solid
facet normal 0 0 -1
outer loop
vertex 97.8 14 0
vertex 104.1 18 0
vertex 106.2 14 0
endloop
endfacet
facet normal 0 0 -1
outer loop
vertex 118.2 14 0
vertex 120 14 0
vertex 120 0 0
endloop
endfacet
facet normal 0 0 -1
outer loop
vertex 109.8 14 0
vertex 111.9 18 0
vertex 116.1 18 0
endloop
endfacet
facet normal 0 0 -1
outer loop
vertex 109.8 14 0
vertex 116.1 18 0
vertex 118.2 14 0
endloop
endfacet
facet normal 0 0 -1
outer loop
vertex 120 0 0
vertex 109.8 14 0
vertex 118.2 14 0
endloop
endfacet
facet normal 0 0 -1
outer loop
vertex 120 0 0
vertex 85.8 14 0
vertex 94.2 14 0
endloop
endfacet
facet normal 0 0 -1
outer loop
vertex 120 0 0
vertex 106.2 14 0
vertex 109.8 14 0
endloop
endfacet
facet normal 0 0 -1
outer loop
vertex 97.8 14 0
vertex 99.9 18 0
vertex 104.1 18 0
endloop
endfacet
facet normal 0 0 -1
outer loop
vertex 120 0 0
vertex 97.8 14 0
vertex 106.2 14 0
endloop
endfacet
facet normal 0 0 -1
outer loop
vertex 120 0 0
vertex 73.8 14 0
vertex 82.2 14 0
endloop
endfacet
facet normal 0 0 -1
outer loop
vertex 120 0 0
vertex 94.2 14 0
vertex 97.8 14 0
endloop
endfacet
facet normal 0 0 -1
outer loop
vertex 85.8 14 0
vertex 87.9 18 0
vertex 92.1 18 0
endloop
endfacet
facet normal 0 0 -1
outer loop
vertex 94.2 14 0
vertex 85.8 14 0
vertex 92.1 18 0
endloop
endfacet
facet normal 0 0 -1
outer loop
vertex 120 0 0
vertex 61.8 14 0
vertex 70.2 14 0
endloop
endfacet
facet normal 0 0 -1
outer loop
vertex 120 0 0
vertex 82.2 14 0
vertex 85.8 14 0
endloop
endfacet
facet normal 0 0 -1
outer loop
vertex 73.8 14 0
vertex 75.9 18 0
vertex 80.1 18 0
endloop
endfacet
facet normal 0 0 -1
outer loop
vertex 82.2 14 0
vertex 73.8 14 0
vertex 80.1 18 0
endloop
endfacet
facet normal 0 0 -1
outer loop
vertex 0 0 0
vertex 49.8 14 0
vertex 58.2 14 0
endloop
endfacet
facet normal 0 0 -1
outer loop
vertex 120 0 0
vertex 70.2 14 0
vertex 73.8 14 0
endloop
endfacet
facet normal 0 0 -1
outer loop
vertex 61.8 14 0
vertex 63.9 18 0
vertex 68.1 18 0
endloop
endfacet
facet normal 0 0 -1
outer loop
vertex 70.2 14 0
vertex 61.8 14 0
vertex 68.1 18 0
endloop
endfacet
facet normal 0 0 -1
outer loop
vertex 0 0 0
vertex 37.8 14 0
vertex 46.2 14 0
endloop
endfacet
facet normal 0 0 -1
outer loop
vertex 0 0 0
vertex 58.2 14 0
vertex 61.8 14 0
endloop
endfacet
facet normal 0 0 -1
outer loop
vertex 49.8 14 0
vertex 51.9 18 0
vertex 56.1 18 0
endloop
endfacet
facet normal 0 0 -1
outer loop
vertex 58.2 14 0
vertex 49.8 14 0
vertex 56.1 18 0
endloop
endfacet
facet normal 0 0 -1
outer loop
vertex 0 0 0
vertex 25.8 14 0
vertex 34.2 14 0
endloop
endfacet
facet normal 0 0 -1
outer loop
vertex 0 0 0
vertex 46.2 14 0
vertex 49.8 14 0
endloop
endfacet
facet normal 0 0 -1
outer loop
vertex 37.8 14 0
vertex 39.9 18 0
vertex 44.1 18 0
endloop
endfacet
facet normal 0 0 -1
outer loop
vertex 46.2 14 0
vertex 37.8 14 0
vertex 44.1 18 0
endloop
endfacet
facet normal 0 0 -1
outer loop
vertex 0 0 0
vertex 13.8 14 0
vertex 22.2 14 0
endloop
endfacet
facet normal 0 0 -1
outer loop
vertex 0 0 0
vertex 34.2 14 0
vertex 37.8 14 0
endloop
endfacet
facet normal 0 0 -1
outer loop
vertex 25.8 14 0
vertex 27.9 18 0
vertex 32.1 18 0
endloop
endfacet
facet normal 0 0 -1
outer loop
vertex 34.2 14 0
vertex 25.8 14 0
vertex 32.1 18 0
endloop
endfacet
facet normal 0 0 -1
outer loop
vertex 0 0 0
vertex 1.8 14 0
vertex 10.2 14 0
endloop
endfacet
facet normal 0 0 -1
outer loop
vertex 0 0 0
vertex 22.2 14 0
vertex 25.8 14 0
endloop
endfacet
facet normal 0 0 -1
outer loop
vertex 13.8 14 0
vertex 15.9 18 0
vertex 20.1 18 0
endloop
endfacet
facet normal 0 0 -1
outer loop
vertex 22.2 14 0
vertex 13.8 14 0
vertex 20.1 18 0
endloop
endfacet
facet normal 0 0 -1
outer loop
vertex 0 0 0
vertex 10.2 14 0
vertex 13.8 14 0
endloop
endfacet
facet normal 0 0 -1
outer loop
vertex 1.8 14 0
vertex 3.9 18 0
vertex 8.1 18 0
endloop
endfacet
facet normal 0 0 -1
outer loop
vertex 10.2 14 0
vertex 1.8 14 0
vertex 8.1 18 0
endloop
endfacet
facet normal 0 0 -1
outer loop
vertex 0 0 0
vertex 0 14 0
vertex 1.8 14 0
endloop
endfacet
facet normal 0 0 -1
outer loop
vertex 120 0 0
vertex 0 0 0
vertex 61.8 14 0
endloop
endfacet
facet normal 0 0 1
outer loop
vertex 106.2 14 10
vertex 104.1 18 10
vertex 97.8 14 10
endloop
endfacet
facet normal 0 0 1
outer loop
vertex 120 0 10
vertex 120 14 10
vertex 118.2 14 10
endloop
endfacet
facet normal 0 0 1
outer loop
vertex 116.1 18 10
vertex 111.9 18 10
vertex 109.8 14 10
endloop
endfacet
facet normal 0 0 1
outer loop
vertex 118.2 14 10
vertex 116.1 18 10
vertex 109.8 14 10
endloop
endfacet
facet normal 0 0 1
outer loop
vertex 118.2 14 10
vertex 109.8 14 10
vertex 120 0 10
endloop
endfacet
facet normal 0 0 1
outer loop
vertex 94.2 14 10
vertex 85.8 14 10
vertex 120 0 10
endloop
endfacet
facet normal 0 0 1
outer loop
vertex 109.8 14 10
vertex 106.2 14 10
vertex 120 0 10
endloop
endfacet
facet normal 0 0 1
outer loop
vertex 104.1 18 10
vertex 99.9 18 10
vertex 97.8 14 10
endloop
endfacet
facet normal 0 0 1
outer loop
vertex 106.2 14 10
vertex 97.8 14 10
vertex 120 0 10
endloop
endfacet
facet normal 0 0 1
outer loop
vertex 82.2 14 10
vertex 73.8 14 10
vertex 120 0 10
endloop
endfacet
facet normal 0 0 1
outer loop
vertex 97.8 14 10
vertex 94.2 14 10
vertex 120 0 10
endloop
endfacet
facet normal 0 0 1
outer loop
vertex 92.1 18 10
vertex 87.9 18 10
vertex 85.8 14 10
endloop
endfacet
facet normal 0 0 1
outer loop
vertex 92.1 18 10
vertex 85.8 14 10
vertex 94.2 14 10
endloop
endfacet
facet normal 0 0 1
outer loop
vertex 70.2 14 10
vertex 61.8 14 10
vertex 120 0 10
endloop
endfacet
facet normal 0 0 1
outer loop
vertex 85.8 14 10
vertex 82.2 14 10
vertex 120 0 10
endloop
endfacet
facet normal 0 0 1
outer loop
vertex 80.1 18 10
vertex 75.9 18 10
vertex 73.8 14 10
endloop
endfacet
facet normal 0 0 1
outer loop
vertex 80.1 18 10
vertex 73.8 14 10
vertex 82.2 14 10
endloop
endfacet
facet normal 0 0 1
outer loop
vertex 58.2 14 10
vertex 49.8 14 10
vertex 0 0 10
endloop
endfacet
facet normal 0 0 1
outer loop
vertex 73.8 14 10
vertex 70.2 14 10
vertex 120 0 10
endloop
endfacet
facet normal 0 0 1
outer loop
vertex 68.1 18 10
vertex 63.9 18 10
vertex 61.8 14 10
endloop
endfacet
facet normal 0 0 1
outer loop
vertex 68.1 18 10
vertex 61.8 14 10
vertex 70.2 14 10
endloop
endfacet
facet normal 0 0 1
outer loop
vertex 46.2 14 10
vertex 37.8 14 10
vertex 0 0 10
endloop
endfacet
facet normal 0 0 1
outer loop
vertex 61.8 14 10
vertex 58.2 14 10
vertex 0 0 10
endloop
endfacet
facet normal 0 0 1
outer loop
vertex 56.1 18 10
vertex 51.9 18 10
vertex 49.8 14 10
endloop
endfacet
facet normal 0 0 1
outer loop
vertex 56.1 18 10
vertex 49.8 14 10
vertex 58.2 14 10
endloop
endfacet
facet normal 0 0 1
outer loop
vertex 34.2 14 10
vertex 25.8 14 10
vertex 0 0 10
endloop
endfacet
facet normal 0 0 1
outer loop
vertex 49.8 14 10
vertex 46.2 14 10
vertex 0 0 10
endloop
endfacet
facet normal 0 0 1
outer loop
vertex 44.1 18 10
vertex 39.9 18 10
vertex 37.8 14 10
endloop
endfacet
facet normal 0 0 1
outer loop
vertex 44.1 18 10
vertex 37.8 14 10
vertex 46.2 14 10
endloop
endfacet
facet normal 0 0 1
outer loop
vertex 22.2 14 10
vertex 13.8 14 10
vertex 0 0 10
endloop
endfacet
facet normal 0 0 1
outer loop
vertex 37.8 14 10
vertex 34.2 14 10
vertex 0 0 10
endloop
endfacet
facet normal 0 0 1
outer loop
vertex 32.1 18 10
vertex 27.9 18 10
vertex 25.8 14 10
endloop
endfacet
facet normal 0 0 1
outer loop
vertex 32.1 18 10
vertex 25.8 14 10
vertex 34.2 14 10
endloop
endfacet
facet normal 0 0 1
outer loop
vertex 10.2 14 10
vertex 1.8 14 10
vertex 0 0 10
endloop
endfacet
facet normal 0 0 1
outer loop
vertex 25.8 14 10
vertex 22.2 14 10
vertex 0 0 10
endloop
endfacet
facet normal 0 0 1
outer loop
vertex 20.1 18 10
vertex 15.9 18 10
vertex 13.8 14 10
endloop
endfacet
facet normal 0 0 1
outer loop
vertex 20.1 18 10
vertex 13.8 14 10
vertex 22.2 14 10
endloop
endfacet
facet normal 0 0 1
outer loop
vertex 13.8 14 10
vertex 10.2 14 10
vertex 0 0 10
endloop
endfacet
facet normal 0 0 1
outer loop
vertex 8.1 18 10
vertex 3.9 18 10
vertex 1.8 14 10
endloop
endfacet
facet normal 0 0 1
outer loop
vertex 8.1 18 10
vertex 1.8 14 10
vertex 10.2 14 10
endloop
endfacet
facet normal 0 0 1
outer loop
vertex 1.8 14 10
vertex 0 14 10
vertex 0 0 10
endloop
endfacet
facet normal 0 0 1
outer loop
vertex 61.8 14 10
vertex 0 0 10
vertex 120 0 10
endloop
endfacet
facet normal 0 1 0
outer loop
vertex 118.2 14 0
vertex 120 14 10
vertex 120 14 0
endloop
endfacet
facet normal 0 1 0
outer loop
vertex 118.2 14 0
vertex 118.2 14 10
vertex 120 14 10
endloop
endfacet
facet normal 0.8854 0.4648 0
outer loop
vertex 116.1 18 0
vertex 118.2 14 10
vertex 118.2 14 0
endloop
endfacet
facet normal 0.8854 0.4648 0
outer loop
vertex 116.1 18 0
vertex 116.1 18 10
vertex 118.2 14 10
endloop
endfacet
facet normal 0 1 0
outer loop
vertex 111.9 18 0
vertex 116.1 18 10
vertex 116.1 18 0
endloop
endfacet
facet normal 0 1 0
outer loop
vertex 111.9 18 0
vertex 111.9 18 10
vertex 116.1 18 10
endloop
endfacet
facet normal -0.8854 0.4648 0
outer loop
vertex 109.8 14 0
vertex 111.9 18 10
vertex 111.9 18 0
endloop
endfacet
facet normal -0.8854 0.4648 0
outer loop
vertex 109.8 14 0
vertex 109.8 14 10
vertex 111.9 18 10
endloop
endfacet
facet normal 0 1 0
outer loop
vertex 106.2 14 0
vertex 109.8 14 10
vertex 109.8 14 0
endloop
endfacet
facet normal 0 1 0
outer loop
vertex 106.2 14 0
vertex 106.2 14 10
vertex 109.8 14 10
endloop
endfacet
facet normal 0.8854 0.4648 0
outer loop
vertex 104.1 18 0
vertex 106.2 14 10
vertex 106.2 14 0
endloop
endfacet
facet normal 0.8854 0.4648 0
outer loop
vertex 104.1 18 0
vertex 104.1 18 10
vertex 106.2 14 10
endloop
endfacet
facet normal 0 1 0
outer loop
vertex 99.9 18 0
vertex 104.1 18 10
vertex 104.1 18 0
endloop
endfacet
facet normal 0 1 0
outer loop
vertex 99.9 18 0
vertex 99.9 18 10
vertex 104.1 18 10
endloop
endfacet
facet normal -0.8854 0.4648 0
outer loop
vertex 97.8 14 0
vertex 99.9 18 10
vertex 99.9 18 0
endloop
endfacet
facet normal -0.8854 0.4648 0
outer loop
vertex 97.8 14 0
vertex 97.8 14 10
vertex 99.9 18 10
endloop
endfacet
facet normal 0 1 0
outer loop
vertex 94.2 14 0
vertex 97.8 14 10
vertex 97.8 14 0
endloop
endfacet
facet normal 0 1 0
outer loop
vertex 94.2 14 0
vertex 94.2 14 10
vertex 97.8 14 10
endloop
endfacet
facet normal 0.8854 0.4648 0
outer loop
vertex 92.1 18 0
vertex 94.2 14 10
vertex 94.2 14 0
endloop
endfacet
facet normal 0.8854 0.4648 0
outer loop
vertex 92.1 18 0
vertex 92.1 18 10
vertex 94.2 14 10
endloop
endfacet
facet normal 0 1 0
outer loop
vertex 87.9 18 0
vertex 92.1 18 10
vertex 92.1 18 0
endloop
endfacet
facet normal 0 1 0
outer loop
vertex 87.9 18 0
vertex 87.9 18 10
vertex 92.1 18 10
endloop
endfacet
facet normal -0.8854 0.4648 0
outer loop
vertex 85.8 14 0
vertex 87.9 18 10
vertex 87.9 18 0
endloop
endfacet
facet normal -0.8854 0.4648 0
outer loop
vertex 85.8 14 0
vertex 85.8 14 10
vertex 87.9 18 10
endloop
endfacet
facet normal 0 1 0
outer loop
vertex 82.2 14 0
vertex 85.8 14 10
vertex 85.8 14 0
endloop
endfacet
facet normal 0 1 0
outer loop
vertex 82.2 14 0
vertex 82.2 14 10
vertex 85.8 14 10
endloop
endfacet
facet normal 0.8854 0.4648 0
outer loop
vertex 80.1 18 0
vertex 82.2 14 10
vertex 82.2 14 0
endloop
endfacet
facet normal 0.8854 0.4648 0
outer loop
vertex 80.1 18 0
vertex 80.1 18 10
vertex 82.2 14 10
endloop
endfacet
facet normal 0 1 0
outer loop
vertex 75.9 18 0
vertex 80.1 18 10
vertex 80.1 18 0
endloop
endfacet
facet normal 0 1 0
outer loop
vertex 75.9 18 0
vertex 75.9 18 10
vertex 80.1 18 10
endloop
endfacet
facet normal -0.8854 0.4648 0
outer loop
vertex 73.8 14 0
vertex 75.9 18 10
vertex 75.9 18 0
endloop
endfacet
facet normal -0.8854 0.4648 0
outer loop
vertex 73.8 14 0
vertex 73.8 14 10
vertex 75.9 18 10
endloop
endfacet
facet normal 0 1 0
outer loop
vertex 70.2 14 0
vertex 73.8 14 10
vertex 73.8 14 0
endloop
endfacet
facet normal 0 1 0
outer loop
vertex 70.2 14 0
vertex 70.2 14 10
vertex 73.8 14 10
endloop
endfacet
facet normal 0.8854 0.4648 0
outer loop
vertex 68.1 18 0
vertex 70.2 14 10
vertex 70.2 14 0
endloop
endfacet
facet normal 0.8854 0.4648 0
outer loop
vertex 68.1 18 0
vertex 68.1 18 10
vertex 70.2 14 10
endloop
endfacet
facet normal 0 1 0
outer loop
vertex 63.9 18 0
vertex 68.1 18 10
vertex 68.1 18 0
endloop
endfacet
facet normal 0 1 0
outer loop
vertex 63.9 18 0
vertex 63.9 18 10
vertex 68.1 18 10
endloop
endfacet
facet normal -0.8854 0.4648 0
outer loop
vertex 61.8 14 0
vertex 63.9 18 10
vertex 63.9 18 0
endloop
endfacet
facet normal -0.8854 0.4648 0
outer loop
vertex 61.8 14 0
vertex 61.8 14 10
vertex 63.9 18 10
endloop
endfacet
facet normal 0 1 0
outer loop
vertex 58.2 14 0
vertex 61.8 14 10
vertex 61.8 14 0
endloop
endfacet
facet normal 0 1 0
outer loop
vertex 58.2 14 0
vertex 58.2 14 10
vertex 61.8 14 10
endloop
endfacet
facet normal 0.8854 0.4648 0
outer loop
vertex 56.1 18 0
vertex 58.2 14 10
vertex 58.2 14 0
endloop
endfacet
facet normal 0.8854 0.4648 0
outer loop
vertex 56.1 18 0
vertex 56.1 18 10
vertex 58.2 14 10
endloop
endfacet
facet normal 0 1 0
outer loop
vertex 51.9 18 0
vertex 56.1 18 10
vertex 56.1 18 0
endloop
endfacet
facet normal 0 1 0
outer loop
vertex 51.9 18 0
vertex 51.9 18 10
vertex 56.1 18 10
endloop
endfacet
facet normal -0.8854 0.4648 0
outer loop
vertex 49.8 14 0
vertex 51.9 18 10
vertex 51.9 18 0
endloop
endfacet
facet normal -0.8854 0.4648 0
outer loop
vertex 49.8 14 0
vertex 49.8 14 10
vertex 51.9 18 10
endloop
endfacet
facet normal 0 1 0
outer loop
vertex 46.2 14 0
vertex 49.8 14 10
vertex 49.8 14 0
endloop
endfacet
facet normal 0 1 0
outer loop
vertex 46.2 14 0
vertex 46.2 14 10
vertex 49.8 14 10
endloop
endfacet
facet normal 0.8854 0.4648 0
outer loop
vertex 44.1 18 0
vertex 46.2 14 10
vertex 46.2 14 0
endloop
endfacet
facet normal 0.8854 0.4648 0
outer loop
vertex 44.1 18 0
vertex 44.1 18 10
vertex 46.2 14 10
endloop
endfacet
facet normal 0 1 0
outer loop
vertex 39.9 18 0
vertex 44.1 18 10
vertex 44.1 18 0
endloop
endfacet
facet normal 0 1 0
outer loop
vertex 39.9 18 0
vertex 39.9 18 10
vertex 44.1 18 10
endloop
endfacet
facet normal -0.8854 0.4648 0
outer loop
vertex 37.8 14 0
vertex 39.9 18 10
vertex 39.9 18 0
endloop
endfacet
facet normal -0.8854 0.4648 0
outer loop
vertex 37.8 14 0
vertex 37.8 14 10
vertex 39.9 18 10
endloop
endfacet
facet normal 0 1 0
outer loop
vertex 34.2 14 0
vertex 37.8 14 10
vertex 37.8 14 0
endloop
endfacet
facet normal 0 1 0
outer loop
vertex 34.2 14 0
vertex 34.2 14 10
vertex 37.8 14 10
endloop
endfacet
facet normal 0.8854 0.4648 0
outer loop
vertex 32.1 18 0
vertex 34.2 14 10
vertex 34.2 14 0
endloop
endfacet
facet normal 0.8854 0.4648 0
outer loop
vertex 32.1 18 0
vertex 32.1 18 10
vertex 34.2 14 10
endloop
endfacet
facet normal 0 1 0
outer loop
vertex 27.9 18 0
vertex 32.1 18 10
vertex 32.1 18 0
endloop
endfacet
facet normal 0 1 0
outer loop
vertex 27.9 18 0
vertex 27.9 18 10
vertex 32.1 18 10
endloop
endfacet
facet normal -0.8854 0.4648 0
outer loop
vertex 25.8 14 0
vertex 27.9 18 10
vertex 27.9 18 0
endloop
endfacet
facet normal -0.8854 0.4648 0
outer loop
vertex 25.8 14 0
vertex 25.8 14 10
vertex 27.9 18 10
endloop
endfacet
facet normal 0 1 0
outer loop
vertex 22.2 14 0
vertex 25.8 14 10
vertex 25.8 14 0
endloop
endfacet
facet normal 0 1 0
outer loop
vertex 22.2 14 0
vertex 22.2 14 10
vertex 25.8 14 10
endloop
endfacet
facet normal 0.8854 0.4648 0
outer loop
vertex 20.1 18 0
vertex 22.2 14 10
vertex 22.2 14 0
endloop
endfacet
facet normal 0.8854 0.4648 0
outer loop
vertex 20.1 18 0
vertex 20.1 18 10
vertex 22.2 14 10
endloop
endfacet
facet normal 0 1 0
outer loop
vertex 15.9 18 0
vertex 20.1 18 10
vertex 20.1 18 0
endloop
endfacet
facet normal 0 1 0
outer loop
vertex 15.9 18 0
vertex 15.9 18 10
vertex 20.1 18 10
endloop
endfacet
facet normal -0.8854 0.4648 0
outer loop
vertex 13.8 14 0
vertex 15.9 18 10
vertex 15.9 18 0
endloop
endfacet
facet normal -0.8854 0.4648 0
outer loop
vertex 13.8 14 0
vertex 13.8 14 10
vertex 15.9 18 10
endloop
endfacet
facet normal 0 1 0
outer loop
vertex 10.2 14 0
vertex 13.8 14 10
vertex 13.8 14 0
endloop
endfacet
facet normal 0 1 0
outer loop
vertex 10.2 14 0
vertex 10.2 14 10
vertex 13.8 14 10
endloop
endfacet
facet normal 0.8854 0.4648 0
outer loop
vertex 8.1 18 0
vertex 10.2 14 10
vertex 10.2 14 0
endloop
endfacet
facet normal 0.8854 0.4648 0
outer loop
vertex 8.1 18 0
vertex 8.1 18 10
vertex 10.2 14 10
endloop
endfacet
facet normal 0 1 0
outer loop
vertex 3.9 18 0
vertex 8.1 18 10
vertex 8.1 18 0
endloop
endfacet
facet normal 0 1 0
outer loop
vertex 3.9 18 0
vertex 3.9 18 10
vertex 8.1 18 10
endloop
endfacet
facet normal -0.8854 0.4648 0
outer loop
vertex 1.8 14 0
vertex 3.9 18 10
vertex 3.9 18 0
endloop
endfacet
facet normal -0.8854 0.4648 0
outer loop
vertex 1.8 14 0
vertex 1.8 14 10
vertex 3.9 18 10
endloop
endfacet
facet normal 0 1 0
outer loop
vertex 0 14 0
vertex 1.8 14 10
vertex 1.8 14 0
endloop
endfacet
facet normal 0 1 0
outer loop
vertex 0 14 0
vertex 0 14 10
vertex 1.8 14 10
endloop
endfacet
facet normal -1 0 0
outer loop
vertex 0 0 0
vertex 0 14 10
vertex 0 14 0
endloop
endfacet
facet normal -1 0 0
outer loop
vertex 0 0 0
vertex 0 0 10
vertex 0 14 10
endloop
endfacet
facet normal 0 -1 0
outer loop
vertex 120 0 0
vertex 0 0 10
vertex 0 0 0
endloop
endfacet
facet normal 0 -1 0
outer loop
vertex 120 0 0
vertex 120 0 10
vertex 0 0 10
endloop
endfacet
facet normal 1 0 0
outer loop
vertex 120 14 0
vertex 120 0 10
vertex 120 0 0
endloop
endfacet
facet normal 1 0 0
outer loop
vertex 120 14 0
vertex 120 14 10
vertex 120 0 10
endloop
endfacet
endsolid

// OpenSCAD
$fn = 32;

// ----------------------------------------------------------------------
// Gear rack: 10 teeth, pitch 12 mm
// ----------------------------------------------------------------------

// --- parameters (mm) ---
teeth = 10;               // number of teeth
pitch = 12;               // tooth pitch, X
root_w = 8.4;             // tooth width at the root
tip_w = 4.2;              // tooth width at the tip
base_h = 14;              // rack body height, Y
tooth_h = 4;              // tooth height above the body
plate_t = 10;             // rack width, Z (extrusion height)

rack_l = teeth * pitch;  // overall length
total_h = base_h + tooth_h;  // overall height

profile = [[0, 0], [120, 0], [120, 14], [118.2, 14], [116.1, 18], [111.9, 18], [109.8, 14], [106.2, 14], [104.1, 18], [99.9, 18], [97.8, 14], [94.2, 14], [92.1, 18], [87.9, 18], [85.8, 14], [82.2, 14], [80.1, 18], [75.9, 18], [73.8, 14], [70.2, 14], [68.1, 18], [63.9, 18], [61.8, 14], [58.2, 14], [56.1, 18], [51.9, 18], [49.8, 14], [46.2, 14], [44.1, 18], [39.9, 18], [37.8, 14], [34.2, 14], [32.1, 18], [27.9, 18], [25.8, 14], [22.2, 14], [20.1, 18], [15.9, 18], [13.8, 14], [10.2, 14], [8.1, 18], [3.9, 18], [1.8, 14], [0, 14]];  // primary outline, 44 points, counter clockwise

// --- the one profile operation ---
linear_extrude(height = plate_t) polygon(points = profile);
